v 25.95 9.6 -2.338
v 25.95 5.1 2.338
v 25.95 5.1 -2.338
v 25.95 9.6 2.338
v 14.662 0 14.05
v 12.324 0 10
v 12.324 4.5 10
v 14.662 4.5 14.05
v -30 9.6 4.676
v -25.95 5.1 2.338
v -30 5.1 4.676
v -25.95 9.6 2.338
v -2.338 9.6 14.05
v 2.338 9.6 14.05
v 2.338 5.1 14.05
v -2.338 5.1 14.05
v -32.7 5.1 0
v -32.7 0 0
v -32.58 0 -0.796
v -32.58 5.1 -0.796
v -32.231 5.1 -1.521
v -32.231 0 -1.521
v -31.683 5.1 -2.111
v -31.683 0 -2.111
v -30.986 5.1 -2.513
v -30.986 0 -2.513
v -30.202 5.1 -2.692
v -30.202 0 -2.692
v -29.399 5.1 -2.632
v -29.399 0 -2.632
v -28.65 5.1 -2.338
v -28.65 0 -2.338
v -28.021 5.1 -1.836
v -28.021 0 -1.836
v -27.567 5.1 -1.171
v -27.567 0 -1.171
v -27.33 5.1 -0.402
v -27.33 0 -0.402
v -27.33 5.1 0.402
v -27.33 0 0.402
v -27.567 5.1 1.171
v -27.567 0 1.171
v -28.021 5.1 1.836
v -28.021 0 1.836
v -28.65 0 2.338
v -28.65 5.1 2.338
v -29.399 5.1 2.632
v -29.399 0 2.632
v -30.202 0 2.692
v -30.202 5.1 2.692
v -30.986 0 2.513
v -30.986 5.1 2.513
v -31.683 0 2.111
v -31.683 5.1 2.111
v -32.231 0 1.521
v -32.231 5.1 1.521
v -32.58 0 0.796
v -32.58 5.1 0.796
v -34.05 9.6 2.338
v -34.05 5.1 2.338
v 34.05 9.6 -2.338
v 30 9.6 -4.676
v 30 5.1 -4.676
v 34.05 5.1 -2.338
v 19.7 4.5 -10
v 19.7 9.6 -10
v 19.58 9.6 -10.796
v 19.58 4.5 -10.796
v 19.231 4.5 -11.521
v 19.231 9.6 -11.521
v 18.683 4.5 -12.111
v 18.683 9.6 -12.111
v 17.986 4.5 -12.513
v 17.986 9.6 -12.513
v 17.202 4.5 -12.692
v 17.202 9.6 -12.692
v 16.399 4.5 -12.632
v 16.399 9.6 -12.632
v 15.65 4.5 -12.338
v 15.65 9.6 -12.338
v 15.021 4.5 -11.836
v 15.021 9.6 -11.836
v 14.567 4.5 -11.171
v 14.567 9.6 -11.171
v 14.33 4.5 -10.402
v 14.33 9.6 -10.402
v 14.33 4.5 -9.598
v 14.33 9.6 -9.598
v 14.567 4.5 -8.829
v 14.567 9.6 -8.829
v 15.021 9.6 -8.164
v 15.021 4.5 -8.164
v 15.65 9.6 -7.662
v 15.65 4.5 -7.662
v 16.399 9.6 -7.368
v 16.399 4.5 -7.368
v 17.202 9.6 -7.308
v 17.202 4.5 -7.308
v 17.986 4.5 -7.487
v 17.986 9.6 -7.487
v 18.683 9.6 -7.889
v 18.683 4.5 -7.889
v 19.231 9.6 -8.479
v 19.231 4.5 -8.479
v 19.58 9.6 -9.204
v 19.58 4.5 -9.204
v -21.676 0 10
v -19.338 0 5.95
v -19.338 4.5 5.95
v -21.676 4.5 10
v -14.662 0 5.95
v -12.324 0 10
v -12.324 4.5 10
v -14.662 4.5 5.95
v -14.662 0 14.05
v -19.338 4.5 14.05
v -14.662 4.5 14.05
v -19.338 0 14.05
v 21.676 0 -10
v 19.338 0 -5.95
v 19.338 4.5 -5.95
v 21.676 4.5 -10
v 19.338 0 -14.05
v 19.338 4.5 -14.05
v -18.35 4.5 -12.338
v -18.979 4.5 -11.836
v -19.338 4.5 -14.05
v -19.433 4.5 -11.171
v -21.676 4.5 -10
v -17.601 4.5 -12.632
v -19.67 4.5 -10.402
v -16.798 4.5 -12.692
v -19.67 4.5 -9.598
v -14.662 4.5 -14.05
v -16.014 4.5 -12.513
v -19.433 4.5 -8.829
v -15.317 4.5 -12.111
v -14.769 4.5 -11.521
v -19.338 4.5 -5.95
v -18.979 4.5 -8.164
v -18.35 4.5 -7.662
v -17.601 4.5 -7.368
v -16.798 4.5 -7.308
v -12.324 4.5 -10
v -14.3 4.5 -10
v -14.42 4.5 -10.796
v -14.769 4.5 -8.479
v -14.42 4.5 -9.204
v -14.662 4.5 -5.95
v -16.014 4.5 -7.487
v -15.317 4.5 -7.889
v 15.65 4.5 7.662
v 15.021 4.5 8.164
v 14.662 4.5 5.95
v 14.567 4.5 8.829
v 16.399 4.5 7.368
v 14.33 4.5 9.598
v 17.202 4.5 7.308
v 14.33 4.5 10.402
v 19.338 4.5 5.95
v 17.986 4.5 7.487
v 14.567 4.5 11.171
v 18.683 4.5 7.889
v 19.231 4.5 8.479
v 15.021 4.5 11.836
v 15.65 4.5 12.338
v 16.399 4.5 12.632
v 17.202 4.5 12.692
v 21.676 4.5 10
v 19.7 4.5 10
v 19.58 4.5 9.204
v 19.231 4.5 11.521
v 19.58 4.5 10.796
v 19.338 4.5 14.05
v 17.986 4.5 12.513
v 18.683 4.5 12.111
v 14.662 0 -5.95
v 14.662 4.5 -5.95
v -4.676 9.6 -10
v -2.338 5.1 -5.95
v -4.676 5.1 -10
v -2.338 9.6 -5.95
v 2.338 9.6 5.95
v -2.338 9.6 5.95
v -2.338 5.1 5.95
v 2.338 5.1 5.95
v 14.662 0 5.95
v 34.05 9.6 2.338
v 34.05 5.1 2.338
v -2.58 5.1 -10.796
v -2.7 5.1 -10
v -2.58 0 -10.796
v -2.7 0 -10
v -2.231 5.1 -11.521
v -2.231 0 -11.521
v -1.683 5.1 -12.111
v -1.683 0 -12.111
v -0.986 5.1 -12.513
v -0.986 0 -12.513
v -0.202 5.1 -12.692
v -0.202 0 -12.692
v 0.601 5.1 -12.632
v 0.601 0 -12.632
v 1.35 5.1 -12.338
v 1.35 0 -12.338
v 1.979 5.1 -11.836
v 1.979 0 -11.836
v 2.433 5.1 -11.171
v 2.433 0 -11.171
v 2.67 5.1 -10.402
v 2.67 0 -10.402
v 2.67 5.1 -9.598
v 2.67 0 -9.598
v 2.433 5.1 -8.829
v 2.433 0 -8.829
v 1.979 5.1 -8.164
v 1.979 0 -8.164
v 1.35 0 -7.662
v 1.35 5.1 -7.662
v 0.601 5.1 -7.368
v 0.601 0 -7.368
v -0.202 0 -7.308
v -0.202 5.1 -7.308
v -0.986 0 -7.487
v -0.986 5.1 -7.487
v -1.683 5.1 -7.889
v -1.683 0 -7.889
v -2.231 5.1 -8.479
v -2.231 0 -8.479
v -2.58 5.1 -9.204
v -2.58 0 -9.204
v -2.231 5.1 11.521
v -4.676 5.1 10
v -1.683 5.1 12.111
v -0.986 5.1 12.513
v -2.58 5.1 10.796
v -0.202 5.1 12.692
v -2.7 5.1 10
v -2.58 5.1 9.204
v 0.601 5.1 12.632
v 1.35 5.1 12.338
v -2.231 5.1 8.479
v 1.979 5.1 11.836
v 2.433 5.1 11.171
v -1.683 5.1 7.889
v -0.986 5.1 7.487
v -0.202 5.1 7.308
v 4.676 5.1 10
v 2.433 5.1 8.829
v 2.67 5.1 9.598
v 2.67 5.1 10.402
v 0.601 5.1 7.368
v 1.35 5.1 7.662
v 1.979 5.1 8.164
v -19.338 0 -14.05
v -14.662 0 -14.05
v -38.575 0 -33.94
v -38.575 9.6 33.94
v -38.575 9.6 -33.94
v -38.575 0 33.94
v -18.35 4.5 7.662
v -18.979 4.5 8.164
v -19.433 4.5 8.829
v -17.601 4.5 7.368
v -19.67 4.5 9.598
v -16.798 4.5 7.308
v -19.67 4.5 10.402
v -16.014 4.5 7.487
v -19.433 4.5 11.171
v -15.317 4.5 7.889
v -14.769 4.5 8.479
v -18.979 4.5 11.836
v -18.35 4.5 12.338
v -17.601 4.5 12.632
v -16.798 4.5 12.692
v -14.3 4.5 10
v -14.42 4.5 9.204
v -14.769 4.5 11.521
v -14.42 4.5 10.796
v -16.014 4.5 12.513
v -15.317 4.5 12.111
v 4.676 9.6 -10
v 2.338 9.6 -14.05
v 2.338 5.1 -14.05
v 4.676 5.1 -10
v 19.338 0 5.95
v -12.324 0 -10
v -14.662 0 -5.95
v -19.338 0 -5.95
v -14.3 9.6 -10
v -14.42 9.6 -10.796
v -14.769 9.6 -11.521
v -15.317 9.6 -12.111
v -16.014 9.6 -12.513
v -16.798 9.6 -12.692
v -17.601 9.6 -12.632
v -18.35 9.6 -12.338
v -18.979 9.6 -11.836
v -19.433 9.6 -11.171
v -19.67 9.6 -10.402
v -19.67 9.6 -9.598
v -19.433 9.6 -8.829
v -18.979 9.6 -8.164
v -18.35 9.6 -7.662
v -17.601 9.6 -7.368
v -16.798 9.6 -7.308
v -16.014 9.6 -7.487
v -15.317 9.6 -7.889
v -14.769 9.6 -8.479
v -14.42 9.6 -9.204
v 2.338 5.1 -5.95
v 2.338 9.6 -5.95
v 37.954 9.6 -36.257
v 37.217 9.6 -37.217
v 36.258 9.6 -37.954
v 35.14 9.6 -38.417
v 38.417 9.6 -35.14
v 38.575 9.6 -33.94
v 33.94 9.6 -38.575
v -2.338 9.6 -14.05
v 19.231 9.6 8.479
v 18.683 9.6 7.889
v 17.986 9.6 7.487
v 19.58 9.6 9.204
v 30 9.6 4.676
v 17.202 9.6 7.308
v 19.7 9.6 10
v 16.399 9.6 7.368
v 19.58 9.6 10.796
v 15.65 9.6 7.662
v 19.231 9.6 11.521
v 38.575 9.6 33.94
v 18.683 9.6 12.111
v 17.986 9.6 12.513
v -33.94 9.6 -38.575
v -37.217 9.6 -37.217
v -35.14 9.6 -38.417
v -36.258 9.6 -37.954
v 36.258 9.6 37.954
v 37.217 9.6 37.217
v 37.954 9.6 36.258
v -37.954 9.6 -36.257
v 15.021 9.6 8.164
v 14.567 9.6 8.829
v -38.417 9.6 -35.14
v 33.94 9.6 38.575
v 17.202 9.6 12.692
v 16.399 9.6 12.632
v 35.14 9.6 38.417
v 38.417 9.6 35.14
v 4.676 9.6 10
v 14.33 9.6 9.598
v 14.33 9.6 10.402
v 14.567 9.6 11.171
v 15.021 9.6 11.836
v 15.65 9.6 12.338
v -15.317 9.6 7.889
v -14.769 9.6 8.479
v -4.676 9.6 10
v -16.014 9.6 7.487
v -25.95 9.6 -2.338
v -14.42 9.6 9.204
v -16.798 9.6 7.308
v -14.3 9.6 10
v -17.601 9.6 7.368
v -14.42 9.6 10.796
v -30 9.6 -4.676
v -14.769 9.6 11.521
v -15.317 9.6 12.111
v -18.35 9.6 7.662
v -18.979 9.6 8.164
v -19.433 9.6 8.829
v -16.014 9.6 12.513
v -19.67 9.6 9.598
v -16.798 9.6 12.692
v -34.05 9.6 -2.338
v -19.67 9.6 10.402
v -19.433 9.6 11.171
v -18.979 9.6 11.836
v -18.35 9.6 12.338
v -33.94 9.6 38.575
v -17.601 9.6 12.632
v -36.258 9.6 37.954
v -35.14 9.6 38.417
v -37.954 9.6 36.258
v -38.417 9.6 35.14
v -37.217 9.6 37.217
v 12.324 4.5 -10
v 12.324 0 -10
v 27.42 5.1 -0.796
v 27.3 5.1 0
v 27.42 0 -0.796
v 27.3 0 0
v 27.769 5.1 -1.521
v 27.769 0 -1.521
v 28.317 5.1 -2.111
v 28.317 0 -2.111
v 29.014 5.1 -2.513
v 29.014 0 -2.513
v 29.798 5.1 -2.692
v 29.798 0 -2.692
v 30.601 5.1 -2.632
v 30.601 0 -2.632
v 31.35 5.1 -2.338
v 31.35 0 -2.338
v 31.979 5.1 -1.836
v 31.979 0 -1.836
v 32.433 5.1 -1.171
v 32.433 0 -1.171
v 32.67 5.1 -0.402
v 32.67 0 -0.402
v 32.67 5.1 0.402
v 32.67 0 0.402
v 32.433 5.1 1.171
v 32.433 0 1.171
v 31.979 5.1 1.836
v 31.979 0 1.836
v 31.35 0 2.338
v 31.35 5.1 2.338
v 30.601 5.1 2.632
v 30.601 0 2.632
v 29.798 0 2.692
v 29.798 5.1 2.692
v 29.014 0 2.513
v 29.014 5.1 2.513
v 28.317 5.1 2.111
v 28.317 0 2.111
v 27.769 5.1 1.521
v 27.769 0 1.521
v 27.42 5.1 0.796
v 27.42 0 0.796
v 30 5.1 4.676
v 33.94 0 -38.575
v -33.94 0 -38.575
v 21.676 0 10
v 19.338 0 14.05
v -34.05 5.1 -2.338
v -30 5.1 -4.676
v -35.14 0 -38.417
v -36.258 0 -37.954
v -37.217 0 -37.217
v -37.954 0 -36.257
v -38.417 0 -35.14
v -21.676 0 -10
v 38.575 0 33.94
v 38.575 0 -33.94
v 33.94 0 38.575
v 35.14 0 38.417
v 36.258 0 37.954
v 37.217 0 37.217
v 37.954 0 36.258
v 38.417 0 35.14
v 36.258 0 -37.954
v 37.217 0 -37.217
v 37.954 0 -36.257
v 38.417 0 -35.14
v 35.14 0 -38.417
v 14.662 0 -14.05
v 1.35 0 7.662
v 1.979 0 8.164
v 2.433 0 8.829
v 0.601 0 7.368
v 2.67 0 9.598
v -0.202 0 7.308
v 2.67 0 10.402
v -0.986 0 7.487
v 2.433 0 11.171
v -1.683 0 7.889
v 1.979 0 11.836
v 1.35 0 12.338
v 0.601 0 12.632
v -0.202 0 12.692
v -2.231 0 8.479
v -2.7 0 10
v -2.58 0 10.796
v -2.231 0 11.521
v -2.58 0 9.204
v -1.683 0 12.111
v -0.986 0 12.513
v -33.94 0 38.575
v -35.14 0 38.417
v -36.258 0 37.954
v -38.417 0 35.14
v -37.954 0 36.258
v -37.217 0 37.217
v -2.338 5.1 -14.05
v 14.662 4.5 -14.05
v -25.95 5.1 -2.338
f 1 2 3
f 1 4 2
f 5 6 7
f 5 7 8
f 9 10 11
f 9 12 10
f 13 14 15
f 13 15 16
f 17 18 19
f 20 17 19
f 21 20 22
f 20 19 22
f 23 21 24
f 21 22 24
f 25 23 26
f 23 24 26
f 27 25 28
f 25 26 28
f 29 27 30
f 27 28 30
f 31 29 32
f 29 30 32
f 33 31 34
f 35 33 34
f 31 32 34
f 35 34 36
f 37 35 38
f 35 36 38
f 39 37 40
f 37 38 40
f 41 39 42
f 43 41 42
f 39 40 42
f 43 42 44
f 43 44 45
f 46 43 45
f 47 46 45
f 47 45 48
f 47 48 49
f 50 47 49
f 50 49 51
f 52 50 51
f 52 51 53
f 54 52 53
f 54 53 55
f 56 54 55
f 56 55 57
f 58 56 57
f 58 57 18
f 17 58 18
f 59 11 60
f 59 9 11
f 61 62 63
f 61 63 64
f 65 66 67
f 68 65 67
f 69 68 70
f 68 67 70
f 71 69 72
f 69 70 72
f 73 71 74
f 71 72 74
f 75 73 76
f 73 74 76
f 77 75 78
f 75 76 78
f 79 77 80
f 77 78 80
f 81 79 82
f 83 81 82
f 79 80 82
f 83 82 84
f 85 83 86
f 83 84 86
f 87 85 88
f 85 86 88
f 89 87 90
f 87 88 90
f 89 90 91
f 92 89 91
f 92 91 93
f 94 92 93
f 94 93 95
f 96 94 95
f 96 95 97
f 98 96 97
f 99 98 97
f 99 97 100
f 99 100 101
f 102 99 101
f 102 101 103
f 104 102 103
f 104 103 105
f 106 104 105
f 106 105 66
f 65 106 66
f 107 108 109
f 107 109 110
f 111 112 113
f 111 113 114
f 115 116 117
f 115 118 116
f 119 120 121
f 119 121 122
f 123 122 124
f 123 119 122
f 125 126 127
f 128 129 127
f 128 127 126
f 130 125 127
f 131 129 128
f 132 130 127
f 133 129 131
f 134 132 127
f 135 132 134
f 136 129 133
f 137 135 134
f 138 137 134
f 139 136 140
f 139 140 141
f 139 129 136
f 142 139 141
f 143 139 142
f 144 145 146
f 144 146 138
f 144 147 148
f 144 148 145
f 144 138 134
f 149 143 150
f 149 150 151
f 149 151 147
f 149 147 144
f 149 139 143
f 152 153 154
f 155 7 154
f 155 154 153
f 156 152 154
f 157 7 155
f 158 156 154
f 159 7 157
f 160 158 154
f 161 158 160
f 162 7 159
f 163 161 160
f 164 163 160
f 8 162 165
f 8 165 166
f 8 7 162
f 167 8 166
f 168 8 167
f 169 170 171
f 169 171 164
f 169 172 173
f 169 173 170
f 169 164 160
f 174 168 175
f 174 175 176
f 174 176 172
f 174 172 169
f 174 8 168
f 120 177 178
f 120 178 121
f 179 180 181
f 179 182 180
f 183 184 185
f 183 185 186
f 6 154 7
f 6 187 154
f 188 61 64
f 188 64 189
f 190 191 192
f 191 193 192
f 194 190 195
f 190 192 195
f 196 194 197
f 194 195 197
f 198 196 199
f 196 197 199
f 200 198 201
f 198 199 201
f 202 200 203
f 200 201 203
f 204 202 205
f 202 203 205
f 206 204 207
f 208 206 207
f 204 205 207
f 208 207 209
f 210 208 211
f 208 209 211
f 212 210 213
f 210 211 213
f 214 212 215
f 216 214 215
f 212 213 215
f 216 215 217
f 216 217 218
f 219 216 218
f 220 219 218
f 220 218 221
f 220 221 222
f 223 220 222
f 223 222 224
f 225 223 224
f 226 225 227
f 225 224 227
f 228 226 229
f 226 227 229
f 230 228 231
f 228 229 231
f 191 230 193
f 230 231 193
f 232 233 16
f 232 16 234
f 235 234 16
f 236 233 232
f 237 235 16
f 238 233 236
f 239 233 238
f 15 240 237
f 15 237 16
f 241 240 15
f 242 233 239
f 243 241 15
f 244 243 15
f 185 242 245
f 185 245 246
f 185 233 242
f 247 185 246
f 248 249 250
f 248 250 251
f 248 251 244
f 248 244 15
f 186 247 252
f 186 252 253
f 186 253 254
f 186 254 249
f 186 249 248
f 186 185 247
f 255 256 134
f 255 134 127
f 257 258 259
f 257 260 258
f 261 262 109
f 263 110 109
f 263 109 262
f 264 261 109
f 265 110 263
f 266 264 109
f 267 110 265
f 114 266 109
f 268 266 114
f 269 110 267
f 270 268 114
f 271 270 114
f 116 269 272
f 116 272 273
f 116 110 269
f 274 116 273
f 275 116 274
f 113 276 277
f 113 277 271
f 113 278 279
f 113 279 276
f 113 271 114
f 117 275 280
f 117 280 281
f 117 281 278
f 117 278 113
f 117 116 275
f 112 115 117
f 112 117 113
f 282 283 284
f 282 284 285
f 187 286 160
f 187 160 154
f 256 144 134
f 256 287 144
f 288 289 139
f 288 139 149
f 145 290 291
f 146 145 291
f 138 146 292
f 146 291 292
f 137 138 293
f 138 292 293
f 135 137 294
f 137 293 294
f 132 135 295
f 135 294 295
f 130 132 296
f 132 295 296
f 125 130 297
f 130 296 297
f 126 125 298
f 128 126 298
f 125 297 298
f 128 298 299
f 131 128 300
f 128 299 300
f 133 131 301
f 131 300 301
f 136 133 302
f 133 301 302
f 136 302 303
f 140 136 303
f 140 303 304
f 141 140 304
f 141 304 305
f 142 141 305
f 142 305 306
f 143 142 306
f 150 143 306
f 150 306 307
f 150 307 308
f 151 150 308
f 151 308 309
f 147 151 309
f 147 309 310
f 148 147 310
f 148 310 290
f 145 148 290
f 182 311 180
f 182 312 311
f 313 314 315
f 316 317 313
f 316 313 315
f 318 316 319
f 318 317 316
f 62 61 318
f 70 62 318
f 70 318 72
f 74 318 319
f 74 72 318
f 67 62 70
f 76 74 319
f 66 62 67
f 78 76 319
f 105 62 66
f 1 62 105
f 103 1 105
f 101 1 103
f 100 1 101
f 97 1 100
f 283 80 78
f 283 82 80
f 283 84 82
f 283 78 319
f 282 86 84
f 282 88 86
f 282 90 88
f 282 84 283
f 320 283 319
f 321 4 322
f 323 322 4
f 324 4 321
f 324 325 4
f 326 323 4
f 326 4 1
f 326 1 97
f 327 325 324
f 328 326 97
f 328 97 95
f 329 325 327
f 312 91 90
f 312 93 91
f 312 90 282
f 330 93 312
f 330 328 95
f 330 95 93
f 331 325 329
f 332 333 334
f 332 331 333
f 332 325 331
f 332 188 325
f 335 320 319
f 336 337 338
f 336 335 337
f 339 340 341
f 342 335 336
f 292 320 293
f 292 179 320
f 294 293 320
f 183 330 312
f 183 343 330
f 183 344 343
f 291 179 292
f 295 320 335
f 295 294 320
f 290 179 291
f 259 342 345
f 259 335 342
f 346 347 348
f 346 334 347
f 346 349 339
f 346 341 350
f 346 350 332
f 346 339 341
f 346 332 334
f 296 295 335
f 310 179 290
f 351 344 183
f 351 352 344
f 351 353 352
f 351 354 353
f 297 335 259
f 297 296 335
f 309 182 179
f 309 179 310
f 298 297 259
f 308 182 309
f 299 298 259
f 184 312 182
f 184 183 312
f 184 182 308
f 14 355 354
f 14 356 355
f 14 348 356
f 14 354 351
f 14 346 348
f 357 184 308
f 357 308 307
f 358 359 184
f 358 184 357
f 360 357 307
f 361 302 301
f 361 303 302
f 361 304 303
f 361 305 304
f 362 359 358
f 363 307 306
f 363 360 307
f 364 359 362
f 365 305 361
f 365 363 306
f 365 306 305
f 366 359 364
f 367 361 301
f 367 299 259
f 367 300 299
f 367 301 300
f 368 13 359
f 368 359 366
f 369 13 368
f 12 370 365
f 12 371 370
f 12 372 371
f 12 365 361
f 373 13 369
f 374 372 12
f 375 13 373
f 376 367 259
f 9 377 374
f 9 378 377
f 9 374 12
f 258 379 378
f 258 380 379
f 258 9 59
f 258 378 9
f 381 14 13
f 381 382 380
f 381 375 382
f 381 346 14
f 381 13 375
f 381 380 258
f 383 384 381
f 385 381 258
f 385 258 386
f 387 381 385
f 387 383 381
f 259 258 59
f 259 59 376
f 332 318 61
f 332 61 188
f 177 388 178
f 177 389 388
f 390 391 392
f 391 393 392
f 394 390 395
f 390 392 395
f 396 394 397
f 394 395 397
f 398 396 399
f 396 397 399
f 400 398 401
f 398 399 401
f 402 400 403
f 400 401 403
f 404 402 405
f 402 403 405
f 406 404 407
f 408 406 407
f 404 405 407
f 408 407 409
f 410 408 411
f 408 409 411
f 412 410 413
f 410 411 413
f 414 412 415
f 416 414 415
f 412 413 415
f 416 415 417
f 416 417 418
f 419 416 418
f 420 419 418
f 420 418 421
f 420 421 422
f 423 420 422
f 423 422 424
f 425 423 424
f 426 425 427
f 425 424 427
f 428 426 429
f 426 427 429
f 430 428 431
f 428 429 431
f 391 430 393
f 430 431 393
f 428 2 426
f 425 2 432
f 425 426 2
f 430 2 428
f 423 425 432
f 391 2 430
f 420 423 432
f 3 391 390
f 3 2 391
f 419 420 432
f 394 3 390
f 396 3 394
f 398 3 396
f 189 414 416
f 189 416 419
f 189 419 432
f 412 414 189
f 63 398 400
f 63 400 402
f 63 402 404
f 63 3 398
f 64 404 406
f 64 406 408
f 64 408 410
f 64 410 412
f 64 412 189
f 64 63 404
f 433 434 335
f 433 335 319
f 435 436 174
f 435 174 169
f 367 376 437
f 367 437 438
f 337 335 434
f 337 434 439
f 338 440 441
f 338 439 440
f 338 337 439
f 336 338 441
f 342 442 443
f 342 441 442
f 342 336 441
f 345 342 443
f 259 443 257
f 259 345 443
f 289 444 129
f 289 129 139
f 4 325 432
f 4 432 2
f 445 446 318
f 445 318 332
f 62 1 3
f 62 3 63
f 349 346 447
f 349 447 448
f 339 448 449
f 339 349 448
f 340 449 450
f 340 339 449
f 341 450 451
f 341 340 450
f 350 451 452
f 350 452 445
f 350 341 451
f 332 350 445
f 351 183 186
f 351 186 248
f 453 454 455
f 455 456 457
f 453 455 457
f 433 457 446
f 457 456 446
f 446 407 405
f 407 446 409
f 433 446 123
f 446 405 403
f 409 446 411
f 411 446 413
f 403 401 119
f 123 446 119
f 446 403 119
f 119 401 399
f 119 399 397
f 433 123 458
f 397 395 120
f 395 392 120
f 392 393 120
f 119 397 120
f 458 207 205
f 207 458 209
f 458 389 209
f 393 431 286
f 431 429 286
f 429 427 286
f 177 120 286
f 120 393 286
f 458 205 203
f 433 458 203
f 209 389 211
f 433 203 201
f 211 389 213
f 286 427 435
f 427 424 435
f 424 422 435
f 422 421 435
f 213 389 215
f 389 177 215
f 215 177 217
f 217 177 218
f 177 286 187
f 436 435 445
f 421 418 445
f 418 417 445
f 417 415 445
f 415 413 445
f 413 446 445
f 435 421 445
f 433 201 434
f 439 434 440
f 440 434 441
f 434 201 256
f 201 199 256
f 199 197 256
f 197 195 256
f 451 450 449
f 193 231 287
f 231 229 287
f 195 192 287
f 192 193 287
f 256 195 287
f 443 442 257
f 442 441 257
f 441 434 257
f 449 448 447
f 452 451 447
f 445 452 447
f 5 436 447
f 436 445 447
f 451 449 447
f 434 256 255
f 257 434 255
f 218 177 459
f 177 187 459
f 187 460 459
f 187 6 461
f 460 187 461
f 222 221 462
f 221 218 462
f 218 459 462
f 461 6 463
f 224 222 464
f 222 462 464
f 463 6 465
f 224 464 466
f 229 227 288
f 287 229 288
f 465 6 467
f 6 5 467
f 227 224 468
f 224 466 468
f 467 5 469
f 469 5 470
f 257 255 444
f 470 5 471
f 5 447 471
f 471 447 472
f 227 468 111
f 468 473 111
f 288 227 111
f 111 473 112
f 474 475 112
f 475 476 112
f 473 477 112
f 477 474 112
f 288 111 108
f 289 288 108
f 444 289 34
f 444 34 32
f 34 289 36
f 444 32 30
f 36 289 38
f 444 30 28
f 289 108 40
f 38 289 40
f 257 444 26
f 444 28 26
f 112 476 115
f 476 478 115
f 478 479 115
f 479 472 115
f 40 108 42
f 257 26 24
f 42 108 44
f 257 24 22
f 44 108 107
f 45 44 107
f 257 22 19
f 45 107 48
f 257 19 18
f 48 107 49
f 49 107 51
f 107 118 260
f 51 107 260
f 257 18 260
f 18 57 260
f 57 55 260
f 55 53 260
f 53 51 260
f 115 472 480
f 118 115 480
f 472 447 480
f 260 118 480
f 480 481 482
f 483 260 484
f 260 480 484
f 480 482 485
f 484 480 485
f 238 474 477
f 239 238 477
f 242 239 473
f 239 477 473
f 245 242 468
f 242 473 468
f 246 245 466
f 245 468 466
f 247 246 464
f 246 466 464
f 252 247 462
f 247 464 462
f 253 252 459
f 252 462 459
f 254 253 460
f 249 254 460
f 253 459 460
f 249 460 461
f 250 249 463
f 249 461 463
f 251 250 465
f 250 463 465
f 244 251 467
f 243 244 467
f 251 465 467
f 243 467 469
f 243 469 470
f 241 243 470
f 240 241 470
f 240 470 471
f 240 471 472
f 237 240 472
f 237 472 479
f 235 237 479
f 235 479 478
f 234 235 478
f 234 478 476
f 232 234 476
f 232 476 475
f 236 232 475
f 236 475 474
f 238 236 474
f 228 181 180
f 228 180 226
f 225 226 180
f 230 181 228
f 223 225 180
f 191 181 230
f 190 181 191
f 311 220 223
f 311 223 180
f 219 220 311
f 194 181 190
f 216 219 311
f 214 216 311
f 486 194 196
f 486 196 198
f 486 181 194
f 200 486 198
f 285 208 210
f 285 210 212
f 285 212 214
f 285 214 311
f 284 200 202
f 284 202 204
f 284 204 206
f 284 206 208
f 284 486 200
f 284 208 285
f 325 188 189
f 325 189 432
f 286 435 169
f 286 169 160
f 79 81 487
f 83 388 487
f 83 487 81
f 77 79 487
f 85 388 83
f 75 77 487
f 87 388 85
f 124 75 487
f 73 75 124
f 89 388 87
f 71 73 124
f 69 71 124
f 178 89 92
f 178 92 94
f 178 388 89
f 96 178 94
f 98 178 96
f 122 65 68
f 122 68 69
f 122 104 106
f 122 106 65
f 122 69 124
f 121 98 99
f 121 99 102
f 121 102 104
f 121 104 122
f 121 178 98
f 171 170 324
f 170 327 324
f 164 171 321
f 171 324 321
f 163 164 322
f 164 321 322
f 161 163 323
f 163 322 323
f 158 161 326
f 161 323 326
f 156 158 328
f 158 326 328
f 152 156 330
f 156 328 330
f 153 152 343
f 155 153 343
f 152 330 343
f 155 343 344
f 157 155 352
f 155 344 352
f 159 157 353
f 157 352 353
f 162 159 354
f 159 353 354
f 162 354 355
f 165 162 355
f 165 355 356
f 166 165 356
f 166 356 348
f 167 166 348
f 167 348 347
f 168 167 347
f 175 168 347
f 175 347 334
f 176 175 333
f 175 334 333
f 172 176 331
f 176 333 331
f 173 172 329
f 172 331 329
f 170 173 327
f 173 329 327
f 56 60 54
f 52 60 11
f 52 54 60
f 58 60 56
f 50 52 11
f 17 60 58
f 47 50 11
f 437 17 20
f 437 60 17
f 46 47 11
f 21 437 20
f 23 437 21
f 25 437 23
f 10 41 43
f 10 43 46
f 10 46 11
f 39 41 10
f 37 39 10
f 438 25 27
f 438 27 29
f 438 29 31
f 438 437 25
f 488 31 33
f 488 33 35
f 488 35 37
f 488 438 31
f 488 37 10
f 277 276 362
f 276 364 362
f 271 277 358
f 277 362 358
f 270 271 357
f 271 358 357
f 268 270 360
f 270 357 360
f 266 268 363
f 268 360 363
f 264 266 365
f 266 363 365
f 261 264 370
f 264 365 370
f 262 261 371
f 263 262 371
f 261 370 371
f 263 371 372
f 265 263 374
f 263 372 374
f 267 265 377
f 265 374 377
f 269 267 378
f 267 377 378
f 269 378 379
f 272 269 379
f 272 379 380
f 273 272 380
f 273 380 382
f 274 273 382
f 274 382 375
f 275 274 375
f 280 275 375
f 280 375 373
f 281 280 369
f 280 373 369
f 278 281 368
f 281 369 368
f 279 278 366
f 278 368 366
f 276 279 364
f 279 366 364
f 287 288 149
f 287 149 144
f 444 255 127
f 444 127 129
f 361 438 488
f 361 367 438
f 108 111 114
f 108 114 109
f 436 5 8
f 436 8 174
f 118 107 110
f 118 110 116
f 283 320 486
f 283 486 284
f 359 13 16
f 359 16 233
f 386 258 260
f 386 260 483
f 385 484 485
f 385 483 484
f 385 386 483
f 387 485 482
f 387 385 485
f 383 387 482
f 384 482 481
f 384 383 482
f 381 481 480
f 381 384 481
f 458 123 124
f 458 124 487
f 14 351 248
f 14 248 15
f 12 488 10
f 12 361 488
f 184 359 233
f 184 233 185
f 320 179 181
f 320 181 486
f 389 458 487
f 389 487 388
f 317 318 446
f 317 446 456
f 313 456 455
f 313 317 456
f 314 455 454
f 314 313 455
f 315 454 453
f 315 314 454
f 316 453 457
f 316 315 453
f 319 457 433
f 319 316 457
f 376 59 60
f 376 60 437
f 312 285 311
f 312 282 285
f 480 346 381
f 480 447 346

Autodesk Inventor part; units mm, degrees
ref_plane "YZ Plane" through (0, 0, 0) normal (1, 0, 0) x (0, 1, 0)
ref_plane "XZ Plane" through (0, 0, 0) normal (0, 1, 0) x (-1, 0, 0)
ref_plane "XY Plane" through (0, 0, 0) normal (0, 0, 1) x (1, 0, 0)
sketch "Boceto1" plane through (0, 0, 0) normal (0, 1, 0) x (-1, 0, 0)
  line L0 (-38.575, 38.575) -> (38.575, 38.575)
  line L1 (38.575, 38.575) -> (38.575, -38.575)
  line L2 (38.575, -38.575) -> (-38.575, -38.575)
  line L3 (-38.575, -38.575) -> (-38.575, 38.575)
  line L4 (-38.575, 38.575) -> (38.575, -38.575) construction
  line L5 (38.575, 38.575) -> (-38.575, -38.575) construction
  circle A0 centre (30, 0) radius 2.7
  circle A1 centre (-30, 0) radius 2.7
  circle A2 centre (0, 10) radius 2.7
  circle A3 centre (0, -10) radius 2.7
  point P0 (0, 0)
  dimension "d0" = 5.4
  dimension "d1" = 60
  dimension "d3" = 20
  dimension "d4" = 10
  dimension "d5" = 30
  dimension "d6" = 77.15
  dimension "d7" = 77.15
extrude "Extrusión1" add sketch "Boceto1" along normal blind 9.6
sketch "Boceto2" plane through (0, 9.6, 0) normal (0, 1, 0) x (1, 0, 0)
  circle A0 centre (-17, -10) radius 2.7
  circle A1 centre (-17, 10) radius 2.7
  circle A2 centre (17, -10) radius 2.7
  circle A3 centre (17, 10) radius 2.7
  line L0 (38.575, 38.575) -> (-38.575, 38.575) projected
  point P0 (0, 0)
  dimension "d10" = 5.4
  dimension "d11" = 17
  dimension "d13" = 20
  dimension "d14" = 10
  dimension "d15" = 17
extrude "Extrusión2" cut sketch "Boceto2" against normal through all
sketch "Boceto3" plane through (0, 9.6, 0) normal (0, 1, 0) x (1, 0, 0)
  circle A0 centre (-30, 0) radius 2.7 projected
  circle A1 centre (-30, 0) radius 4.05
  line L0 (-30, 4.6765) -> (-25.95, 2.3383)
  line L1 (-25.95, 2.3383) -> (-25.95, -2.3383)
  line L2 (-25.95, -2.3383) -> (-30, -4.6765)
  line L3 (-30, -4.6765) -> (-34.05, -2.3383)
  line L4 (-34.05, -2.3383) -> (-34.05, 2.3383)
  line L5 (-34.05, 2.3383) -> (-30, 4.6765)
  circle A2 centre (0, 10) radius 2.7 projected
  circle A3 centre (0, 10) radius 4.05
  circle A4 centre (0, -10) radius 2.7 projected
  circle A5 centre (0, -10) radius 4.05
  circle A6 centre (30, 0) radius 2.7 projected
  circle A7 centre (30, 0) radius 4.05
  line L6 (4.6765, 10) -> (2.3383, 5.95)
  line L7 (2.3383, 5.95) -> (-2.3383, 5.95)
  line L8 (-2.3383, 5.95) -> (-4.6765, 10)
  line L9 (-4.6765, 10) -> (-2.3383, 14.05)
  line L10 (-2.3383, 14.05) -> (2.3383, 14.05)
  line L11 (2.3383, 14.05) -> (4.6765, 10)
  line L12 (4.6765, -10) -> (2.3383, -14.05)
  line L13 (2.3383, -14.05) -> (-2.3383, -14.05)
  line L14 (-2.3383, -14.05) -> (-4.6765, -10)
  line L15 (-4.6765, -10) -> (-2.3383, -5.95)
  line L16 (-2.3383, -5.95) -> (2.3383, -5.95)
  line L17 (2.3383, -5.95) -> (4.6765, -10)
  line L18 (34.05, -2.3383) -> (30, -4.6765)
  line L19 (30, -4.6765) -> (25.95, -2.3383)
  line L20 (25.95, -2.3383) -> (25.95, 2.3383)
  line L21 (25.95, 2.3383) -> (30, 4.6765)
  line L22 (30, 4.6765) -> (34.05, 2.3383)
  line L23 (34.05, 2.3383) -> (34.05, -2.3383)
  point P0 (0, 0)
  dimension "d18" = 8.1
extrude "Extrusión3" cut sketch "Boceto3" against normal blind 4.5 contours A0 | A1 | L1 L2 A1 | A1 L0 L1 | A1 L5 L0 | L2 L3 A1 | A1 L4 L5 | L3 L4 A1 | A2 | A3 | A3 L11 L6 | A3 L10 L11 | L6 L7 A3 | A3 L9 L10 | L7 L8 A3 | A3 L8 L9 | A4 | A5 | A5 L17 L12 | A5 L16 L17 | L12 L13 A5 | A5 L15 L16 | L13 L14 A5 | A5 L14 L15 | A6 | A7 | L23 L18 A7 | A7 L22 L23 | A7 L21 L22 | L18 L19 A7 | A7 L20 L21 | L19 L20 A7
fillet "Empalme1" radius 4.635 4 edges at (-38.575, 4.8, 38.575) (38.575, 4.8, 38.575) (38.575, 4.8, -38.575) (-38.575, 4.8, -38.575)
sketch "Boceto4" plane through (0, 0, 0) normal (0, -1, 0) x (1, 0, 0)
  circle A0 centre (-17, 10) radius 2.7 projected
  circle A1 centre (-17, 10) radius 4.05
  line L0 (-19.3383, 14.05) -> (-14.6617, 14.05)
  line L1 (-14.6617, 14.05) -> (-12.3235, 10)
  line L2 (-12.3235, 10) -> (-14.6617, 5.95)
  line L3 (-14.6617, 5.95) -> (-19.3383, 5.95)
  line L4 (-19.3383, 5.95) -> (-21.6765, 10)
  line L5 (-21.6765, 10) -> (-19.3383, 14.05)
  point P0 (0, 0)
  dimension "d22" = 8.1
extrude "Extrusión4" cut sketch "Boceto4" against normal blind 4.5 contours A0 | A1 | A1 L1 L2 | A1 L0 L1 | L2 L3 A1 | A1 L5 L0 | L3 L4 A1 | A1 L4 L5
pattern_linear "Patrón rectangular1" count 2 spacing 34 along (1, 0, 0) count 2 spacing 20 along (0, 0, -1) of "Extrusión4"
properties part number "UpperJawSupport" material "Plástico ABS"
